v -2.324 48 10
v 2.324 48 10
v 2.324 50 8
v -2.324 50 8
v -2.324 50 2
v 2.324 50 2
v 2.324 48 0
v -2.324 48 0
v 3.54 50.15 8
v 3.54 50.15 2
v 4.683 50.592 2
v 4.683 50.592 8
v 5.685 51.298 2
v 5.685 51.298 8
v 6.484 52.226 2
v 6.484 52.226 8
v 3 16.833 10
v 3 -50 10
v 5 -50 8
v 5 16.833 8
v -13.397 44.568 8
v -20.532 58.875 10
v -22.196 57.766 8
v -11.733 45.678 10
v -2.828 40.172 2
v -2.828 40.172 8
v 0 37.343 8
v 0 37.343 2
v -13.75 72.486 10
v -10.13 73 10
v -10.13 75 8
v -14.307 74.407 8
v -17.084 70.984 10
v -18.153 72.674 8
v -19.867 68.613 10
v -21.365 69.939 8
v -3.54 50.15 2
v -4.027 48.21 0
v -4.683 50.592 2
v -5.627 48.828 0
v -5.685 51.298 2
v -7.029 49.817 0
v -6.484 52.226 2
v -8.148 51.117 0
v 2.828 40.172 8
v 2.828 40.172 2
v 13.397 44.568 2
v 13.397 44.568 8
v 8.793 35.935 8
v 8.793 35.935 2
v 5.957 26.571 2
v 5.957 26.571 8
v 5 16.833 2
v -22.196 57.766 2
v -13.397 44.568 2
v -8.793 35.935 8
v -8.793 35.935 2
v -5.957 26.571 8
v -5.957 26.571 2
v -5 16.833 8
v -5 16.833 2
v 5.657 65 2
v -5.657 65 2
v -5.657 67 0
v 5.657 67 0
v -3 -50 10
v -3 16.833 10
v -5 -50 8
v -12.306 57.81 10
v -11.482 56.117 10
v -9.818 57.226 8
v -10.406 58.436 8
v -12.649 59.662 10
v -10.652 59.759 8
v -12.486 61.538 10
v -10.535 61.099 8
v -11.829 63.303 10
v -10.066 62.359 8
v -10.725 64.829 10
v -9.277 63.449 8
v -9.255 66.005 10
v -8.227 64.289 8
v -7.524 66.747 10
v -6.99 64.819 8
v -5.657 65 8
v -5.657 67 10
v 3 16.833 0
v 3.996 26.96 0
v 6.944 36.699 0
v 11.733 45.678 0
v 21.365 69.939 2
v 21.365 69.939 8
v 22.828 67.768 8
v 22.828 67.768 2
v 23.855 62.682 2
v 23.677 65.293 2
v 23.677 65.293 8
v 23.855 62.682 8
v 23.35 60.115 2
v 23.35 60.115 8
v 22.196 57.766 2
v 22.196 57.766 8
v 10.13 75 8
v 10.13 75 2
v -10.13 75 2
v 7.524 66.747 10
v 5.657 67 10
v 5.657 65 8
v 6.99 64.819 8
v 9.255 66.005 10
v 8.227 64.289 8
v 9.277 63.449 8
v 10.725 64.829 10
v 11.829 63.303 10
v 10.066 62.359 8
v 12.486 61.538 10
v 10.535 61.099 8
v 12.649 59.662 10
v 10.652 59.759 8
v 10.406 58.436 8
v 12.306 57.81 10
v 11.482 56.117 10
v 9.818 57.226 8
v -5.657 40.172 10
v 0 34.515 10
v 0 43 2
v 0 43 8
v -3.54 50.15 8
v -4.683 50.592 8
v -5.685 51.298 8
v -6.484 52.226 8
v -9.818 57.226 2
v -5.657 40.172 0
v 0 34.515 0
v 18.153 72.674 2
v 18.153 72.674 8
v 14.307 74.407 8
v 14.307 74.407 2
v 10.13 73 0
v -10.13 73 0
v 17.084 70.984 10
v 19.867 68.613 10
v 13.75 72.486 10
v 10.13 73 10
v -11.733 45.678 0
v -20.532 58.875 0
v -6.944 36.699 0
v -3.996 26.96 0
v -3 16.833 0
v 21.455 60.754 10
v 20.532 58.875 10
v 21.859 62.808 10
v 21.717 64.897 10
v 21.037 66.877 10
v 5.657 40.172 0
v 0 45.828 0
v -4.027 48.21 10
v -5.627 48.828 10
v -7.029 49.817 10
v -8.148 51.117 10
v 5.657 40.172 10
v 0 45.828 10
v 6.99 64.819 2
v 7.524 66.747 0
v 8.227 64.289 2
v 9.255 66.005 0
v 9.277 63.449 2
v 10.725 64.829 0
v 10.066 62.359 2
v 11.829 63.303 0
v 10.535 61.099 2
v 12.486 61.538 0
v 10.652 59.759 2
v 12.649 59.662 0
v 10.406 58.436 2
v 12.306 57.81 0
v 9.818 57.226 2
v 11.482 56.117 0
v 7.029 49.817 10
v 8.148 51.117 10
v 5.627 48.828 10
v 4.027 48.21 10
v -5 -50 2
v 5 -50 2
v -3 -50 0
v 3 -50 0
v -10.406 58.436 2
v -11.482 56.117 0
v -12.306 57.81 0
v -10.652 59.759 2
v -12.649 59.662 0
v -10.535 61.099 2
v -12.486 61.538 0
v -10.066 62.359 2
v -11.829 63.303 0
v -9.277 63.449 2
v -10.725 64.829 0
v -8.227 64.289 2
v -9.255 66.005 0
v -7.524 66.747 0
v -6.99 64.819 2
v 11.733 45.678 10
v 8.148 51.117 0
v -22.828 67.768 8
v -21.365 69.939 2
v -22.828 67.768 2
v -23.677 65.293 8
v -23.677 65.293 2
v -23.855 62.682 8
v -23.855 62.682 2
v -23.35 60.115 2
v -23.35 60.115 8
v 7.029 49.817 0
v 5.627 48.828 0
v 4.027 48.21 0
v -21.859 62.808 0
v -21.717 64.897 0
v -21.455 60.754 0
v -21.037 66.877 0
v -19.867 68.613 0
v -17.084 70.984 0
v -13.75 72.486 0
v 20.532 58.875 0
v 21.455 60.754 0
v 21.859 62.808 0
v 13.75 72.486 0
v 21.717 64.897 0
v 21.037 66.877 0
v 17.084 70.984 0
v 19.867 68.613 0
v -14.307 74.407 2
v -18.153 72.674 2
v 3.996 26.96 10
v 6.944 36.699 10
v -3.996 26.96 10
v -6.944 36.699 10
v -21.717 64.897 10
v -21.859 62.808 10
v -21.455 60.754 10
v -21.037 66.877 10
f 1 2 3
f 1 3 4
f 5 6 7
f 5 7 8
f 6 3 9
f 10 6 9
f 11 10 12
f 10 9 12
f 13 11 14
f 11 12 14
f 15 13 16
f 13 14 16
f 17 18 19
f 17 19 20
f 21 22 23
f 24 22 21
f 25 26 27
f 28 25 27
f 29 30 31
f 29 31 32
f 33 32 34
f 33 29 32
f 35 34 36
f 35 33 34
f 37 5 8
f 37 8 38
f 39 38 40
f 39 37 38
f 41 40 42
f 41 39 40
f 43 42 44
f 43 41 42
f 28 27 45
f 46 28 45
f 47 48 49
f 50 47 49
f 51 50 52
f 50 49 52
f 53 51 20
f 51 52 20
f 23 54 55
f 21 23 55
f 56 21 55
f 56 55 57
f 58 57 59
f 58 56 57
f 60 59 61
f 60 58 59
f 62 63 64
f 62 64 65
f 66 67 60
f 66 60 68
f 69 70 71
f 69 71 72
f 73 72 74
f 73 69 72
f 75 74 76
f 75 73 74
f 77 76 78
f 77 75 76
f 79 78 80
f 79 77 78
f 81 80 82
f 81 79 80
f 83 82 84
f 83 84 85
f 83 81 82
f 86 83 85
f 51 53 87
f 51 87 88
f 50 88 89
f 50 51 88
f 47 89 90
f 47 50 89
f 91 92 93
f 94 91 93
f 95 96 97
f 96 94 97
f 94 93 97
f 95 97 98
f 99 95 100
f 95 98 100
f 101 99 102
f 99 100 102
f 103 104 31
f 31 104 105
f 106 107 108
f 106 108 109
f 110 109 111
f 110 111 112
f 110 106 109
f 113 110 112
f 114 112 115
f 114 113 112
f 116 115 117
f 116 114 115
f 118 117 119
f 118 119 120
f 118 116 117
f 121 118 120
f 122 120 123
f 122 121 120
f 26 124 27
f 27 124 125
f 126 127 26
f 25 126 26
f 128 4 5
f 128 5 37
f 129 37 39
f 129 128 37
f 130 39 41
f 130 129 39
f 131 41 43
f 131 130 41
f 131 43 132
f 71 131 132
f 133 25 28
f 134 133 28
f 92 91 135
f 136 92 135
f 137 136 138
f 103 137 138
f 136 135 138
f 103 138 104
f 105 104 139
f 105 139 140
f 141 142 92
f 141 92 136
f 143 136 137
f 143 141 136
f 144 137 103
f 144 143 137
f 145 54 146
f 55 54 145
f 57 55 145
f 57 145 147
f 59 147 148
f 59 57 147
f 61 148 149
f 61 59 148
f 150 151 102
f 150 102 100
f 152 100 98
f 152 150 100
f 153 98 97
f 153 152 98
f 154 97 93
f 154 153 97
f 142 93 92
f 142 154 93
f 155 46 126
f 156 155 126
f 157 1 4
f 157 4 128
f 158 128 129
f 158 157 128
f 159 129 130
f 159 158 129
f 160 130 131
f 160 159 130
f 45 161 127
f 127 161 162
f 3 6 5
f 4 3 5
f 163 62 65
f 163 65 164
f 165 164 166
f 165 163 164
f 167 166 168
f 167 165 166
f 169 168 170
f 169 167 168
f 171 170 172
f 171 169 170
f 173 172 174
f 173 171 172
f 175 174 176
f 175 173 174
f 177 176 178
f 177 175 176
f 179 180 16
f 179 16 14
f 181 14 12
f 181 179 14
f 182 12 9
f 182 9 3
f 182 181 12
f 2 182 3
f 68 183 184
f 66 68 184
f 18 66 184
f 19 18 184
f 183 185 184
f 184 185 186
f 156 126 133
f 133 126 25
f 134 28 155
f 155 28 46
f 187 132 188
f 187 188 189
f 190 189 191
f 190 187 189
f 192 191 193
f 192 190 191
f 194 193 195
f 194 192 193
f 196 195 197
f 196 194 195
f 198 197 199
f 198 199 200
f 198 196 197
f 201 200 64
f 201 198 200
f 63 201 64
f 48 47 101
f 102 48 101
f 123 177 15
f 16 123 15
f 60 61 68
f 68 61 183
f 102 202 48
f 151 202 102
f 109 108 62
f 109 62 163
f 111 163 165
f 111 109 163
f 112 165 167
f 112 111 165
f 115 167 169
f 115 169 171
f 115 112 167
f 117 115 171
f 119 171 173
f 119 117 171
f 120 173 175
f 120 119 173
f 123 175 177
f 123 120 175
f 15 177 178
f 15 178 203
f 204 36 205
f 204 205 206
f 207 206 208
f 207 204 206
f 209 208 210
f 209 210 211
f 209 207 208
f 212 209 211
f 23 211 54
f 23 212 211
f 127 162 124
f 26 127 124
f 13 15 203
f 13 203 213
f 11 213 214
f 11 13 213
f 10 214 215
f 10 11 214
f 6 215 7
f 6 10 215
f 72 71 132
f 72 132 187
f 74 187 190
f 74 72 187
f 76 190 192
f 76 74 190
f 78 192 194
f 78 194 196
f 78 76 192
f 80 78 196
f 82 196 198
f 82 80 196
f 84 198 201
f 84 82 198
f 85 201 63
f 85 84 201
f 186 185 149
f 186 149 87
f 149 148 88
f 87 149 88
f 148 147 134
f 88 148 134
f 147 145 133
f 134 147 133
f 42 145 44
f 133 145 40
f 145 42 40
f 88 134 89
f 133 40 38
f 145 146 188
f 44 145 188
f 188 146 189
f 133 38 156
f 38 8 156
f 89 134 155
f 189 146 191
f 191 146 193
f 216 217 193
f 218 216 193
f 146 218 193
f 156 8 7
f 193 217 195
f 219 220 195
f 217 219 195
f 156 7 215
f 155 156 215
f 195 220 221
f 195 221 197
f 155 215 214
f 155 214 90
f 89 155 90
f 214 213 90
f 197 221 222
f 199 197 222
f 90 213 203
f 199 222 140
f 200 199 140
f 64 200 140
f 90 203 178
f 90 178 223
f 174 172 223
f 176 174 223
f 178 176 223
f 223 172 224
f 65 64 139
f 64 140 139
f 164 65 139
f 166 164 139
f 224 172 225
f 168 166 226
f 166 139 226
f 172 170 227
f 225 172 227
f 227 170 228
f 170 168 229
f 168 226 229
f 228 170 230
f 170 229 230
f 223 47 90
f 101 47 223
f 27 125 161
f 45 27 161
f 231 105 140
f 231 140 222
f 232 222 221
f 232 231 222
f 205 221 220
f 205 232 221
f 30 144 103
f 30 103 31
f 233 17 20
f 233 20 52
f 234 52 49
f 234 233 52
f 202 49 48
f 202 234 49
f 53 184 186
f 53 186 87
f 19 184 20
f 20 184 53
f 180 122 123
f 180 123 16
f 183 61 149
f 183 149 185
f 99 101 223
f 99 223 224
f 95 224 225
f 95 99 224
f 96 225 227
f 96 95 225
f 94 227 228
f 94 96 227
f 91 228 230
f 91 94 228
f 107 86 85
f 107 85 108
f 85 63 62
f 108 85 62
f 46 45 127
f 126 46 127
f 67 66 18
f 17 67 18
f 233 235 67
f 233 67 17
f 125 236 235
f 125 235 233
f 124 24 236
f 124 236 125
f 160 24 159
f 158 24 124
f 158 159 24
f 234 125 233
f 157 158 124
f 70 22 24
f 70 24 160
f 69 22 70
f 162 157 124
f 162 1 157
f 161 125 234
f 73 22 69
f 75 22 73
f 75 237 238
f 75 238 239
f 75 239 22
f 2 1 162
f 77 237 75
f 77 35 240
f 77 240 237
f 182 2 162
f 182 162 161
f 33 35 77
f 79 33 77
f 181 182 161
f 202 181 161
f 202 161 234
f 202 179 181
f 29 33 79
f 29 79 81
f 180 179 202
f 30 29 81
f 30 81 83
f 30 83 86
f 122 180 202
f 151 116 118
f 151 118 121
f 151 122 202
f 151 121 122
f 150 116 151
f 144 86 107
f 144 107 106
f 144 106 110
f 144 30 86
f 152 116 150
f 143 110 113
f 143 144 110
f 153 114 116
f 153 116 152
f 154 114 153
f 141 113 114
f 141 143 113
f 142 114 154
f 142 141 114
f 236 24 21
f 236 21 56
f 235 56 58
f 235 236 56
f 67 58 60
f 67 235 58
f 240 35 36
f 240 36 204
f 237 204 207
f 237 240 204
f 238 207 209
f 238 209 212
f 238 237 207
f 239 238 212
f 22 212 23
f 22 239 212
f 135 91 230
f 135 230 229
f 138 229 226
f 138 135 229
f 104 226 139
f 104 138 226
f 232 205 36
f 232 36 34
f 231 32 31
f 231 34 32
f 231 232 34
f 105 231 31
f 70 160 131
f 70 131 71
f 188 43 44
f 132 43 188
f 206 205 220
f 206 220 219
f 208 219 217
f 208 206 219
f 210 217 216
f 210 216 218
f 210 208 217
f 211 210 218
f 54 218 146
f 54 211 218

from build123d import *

# Parameters (mm, degrees)
F0_W        = 30
F0_H        = 10
F1_DEPTH    = 10
F2_R        = 5
F3_T1_DEPTH = 84.348882825
F4_R        = 10
F5_R        = 50
F6_SIZE     = 2
F8_DEPTH    = 10.001
F9_SIZE     = 2


# Not quite as in the source:
# - a fillet or chamfer that OpenCascade refuses, or shapes differently, is made with other operations: its cross-section is extruded or revolved along the edge and cut away or added


with BuildPart() as f1:
    # F0 (on Top) → F1 (new body)
    with BuildSketch(Plane.XY):
        Polygon((5, 50), (-5, 50), (-15, 65), (-15, 75), (-25, 75), (-25, 61.9722436227), (-5, 31.9722436227), (-5, -50), (5, -50), (5, 31.9722436227), (25, 61.9722436227), (25, 75), (15, 75), (15, 65), align=None)
        with Locations((0, 70)):
            Rectangle(F0_W, F0_H)
    extrude(amount=F1_DEPTH)

    # F2
    f2_edges = [f1.edges().sort_by_distance(p)[0] for p in [
        (15, 65, 5),
        (-15, 65, 5),
        (-5, 50, 5),
        (5, 50, 5),
    ]]
    fillet(f2_edges, radius=F2_R)

    # F3: fillet of radius 15 on 2 edges, made by hand

    # F3_s2 → F3_t1 (cut)
    with BuildSketch(Plane.XY.offset(-37.1744414125)):
        with BuildLine():
            ThreePointArc((-25, 61.9722436227), (-20.0149678844, 71.2823679771), (-10.130223435, 75))
            Line((-10.130223435, 75), (-25, 75))
            Line((-25, 75), (-25, 61.9722436227))
        make_face()
        with BuildLine():
            ThreePointArc((25, 61.9722436227), (20.0149678844, 71.2823679771), (10.130223435, 75))
            Line((10.130223435, 75), (25, 75))
            Line((25, 75), (25, 61.9722436227))
        make_face()
    extrude(amount=F3_T1_DEPTH, mode=Mode.SUBTRACT)

    # F4
    f4_edges = [f1.edges().sort_by_distance(p)[0] for p in [
        (-25, 61.972244, 5),
        (25, 61.972244, 5),
    ]]
    fillet(f4_edges, radius=F4_R)

    # F5
    f5_edges = [f1.edges().sort_by_distance(p)[0] for p in [
        (5, 31.972244, 5),
        (-5, 31.972244, 5),
    ]]
    fillet(f5_edges, radius=F5_R)

    # F6
    f6_edges = [f1.edges().sort_by_distance(p)[0] for p in [
        (0, 65, 10),
        (0, 75, 10),
        (0, 50, 0),
        (0, 75, 0),
    ]]
    chamfer(f6_edges, length=F6_SIZE)

    # F7 (on face) → F8 (cut, through all)
    with BuildSketch(Plane.XY.offset(10)):
        Polygon((0, 37.3431457505), (2.8284271247, 40.1715728753), (0, 43), (-2.8284271247, 40.1715728753), align=None)
    extrude(amount=-F8_DEPTH, mode=Mode.SUBTRACT)

    # F9
    f9_edges = [f1.edges().sort_by_distance(p)[0] for p in [
        (1.414214, 41.585786, 10),
        (-1.414214, 41.585786, 10),
        (1.414214, 38.757359, 10),
        (-1.414214, 38.757359, 10),
        (1.414214, 38.757359, 0),
        (1.414214, 41.585786, 0),
        (-1.414214, 41.585786, 0),
        (-1.414214, 38.757359, 0),
    ]]
    chamfer(f9_edges, length=F9_SIZE)


solid = f1.part
